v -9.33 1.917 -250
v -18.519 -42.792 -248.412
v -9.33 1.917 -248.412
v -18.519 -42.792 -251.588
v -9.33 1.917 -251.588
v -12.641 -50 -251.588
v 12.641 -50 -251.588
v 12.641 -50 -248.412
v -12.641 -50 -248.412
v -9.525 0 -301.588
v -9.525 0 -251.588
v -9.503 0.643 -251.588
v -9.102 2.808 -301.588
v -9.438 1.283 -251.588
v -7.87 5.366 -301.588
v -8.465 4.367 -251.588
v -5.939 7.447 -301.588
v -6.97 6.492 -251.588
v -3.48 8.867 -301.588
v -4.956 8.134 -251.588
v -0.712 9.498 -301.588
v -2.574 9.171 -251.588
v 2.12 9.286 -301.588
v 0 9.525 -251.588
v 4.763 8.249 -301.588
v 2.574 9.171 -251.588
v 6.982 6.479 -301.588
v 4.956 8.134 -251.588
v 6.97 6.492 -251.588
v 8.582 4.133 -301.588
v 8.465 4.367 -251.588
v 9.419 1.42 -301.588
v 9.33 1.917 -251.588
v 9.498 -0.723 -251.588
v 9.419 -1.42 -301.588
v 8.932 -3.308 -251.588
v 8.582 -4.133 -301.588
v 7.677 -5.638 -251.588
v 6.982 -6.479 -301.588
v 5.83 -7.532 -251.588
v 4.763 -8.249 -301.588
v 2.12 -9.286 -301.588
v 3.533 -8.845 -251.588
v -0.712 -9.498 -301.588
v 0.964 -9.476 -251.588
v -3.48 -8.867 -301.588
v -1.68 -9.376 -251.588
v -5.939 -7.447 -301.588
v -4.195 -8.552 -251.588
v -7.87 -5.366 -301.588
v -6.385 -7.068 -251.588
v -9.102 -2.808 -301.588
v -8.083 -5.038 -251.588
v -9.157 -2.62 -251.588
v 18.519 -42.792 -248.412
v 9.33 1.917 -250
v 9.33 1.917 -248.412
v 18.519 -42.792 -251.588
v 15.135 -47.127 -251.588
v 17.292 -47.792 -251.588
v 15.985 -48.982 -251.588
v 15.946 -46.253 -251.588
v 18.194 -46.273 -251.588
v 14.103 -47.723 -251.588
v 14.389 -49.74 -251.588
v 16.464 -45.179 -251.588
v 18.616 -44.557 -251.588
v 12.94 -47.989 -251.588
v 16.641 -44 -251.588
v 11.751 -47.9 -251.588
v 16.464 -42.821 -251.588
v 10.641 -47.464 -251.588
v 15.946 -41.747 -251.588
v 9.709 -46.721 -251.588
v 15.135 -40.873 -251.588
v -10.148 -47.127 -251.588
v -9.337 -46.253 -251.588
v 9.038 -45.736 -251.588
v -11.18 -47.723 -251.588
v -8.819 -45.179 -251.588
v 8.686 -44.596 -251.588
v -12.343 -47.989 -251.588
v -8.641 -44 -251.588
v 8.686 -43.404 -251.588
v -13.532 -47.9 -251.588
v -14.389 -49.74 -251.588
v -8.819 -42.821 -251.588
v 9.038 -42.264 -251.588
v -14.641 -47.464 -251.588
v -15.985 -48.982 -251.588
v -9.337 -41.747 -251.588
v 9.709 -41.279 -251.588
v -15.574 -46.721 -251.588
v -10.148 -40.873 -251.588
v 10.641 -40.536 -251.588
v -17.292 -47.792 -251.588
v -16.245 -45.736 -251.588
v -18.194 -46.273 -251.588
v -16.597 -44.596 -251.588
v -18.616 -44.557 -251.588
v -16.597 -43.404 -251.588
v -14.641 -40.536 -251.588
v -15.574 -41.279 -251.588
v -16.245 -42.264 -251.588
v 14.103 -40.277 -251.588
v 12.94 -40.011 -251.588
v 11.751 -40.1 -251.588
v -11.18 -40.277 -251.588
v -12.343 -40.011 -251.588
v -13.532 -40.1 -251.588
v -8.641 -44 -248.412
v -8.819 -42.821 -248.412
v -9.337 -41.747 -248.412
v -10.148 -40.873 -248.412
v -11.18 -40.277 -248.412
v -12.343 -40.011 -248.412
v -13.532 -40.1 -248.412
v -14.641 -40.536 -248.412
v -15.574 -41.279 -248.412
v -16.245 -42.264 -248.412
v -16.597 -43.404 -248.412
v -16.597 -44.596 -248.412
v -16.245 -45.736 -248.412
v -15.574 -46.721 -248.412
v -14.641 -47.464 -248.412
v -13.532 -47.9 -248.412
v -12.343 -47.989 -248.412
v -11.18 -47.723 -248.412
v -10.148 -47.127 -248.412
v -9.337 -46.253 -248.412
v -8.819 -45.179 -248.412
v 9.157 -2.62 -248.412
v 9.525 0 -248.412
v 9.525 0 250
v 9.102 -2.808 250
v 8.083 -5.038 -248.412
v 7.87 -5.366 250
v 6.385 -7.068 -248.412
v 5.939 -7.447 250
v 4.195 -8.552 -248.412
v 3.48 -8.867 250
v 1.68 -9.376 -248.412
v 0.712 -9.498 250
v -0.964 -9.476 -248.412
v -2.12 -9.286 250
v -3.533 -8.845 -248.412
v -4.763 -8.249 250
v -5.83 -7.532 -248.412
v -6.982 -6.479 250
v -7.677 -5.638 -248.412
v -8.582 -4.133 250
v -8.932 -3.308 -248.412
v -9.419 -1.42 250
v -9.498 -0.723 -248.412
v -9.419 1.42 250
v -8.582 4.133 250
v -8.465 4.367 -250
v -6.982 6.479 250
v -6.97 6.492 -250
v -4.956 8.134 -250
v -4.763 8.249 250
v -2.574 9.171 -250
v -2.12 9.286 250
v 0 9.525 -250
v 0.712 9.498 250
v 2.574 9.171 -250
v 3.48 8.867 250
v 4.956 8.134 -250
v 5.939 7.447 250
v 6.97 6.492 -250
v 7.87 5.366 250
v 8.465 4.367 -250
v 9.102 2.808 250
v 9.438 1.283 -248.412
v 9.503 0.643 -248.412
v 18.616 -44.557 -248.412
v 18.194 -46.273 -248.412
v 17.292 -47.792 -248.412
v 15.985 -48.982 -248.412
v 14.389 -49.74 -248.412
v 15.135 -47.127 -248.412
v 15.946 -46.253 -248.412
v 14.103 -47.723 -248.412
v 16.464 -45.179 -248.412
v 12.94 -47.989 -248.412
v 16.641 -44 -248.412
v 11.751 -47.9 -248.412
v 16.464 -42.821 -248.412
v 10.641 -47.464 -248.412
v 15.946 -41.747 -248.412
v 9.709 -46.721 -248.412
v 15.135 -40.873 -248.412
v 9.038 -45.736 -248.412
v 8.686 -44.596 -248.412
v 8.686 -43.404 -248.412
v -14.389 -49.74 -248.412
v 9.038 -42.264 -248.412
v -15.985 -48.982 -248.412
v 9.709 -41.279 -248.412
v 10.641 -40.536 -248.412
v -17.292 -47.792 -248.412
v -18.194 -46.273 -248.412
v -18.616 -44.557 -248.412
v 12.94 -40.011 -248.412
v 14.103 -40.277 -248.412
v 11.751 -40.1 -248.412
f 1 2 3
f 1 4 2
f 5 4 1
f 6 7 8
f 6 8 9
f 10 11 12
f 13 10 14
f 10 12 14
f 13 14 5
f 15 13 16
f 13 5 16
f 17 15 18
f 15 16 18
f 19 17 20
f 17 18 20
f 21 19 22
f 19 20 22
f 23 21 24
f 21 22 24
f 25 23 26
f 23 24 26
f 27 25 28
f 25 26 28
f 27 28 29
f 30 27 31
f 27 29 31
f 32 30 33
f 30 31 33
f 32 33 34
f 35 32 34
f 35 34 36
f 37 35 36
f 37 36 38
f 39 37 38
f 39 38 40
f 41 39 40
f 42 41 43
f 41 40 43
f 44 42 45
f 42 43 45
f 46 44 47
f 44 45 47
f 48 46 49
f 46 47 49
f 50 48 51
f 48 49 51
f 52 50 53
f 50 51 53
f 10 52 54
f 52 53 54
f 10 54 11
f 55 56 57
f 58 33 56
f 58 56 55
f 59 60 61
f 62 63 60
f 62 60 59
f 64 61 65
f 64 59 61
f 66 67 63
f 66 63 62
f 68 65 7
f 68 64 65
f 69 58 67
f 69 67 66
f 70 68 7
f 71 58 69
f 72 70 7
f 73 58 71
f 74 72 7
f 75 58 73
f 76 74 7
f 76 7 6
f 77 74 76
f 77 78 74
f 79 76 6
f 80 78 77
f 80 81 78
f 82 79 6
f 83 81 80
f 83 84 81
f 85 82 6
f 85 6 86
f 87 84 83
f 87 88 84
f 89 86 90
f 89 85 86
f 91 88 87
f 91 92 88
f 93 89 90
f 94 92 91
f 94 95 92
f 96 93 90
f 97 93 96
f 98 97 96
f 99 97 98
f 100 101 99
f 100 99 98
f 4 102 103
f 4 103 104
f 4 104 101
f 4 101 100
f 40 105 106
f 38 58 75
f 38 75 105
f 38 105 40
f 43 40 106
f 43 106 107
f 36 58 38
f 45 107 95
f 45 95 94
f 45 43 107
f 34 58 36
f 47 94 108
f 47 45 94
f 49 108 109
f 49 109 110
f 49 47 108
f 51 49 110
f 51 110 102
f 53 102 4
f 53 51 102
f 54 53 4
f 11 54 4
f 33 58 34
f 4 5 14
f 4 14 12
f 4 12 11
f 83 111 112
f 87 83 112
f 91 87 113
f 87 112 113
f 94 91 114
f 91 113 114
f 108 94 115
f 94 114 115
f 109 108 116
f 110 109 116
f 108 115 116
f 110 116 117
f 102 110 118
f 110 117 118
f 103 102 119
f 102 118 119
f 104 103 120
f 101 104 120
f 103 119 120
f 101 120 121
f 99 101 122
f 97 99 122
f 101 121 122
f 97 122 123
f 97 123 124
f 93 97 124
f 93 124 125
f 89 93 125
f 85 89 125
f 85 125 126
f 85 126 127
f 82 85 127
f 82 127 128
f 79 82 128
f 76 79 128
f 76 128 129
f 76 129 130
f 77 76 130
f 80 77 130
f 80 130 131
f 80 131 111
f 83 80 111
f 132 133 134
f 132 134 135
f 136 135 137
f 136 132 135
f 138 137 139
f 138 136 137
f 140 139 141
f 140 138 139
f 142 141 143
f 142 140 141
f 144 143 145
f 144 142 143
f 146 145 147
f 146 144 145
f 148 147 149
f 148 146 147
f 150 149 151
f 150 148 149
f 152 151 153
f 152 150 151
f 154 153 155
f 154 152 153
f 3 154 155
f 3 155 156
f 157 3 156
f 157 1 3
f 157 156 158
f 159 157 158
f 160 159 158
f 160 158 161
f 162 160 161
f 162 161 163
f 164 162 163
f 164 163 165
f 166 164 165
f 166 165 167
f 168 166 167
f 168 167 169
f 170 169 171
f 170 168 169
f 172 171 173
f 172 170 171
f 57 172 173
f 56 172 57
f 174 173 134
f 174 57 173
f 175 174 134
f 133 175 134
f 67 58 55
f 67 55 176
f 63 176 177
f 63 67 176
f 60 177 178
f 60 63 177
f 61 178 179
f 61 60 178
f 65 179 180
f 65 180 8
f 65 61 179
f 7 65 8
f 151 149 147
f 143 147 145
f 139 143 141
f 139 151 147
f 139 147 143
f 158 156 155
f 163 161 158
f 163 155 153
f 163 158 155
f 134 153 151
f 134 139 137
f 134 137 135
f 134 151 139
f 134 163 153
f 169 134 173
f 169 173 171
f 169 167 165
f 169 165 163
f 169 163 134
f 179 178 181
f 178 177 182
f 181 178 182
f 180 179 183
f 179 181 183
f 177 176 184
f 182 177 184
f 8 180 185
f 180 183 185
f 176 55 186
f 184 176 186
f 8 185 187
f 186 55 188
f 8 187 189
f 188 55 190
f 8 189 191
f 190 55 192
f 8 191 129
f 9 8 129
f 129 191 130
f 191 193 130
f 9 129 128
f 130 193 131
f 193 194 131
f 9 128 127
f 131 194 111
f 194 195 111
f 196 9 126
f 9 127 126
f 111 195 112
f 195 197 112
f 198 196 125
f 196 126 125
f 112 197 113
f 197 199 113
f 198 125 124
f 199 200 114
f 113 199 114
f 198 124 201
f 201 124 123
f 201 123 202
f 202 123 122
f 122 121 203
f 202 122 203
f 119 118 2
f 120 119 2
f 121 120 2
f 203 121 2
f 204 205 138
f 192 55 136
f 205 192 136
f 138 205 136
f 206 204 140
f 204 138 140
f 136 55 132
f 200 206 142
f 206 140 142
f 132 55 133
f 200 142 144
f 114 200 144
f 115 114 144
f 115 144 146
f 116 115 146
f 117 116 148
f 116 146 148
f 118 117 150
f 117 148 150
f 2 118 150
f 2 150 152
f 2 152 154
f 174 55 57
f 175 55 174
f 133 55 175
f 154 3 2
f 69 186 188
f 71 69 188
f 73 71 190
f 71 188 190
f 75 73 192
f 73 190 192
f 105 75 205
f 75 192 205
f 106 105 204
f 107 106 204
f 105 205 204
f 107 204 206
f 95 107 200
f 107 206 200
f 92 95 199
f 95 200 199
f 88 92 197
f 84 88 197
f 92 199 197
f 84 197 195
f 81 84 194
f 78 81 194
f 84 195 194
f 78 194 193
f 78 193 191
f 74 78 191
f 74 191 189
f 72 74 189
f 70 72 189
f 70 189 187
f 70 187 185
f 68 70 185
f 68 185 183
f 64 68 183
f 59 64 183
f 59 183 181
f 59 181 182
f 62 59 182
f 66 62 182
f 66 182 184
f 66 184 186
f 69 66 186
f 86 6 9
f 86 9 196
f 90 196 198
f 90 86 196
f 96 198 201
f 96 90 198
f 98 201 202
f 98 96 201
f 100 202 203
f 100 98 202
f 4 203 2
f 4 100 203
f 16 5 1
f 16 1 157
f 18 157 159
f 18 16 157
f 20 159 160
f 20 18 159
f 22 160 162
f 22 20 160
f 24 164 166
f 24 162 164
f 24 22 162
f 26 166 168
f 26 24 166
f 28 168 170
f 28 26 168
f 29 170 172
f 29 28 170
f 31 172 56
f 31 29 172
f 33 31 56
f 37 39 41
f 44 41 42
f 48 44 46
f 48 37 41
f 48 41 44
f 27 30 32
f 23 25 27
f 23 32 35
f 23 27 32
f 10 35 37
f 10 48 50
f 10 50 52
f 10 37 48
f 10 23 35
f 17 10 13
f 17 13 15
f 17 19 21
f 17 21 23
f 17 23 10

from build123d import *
from build123d.topology import SkipClean

# Parameters (mm, degrees)
SKETCH1_R           = 9.525
BOSS_EXTRUDE1_DEPTH = 250
BOSS_EXTRUDE2_DEPTH = 1.5875
CUT_EXTRUDE1_REACH  = 503.261
SKETCH3_R           = 4
SKETCH4_R           = 9.525
BOSS_EXTRUDE3_DEPTH = 50


with BuildPart() as part:
    # Sketch1 → Boss-Extrude1 (new, symmetric)
    with BuildSketch(Plane.XY):
        Circle(SKETCH1_R)
    extrude(amount=BOSS_EXTRUDE1_DEPTH, both=True)

    # Sketch2 → Boss-Extrude2 (add, symmetric)
    with SkipClean():  # the faces are left unmerged after this step: merging them gives an invalid solid
        with BuildSketch(Plane(origin=(0, 0, -250), x_dir=(-1, 0, 0), z_dir=(0, 0, -1))):
            with BuildLine():
                Line((-9.32999835, 1.91748684), (-18.518650577, -42.792134274))
                ThreePointArc((-18.518650577, -42.792134274), (-17.291604236, -47.791622716), (-12.641486262, -50))
                Line((-12.641486262, -50), (12.641486262, -50))
                ThreePointArc((12.641486262, -50), (17.291604236, -47.791622716), (18.518650577, -42.792134274))
                Line((18.518650577, -42.792134274), (9.32999835, 1.91748684))
                ThreePointArc((9.32999835, 1.91748684), (0, 9.525), (-9.32999835, 1.91748684))
            make_face()
        extrude(amount=BOSS_EXTRUDE2_DEPTH, both=True)
    add(part.part.scale(1), mode=Mode.REPLACE)  # the faces are merged on a copy

    # Sketch3 → Cut-Extrude1 (cut, up to next)
    with BuildSketch(Plane.XY.offset(-248.4125), mode=Mode.PRIVATE) as cut_extrude1_sk1:
        with Locations((-12.641486262, -44)):
            Circle(SKETCH3_R)
    cut_extrude1_tool1 = extrude(cut_extrude1_sk1.sketch, amount=-CUT_EXTRUDE1_REACH, mode=Mode.PRIVATE) & part.part
    # Sketch3 → Cut-Extrude1 (cut, up to next)
    with BuildSketch(Plane.XY.offset(-248.4125), mode=Mode.PRIVATE) as cut_extrude1_sk2:
        with Locations((12.641486262, -44)):
            Circle(SKETCH3_R)
    cut_extrude1_tool2 = extrude(cut_extrude1_sk2.sketch, amount=-CUT_EXTRUDE1_REACH, mode=Mode.PRIVATE) & part.part
    add(cut_extrude1_tool1.solids().sort_by_distance((-12.641486, -44, -248.4125))[0], mode=Mode.SUBTRACT)
    add(cut_extrude1_tool2.solids().sort_by_distance((12.641486, -44, -248.4125))[0], mode=Mode.SUBTRACT)

    # Sketch4 → Boss-Extrude3 (add)
    with BuildSketch(Plane(origin=(0, 0, -251.5875), x_dir=(-1, 0, 0), z_dir=(0, 0, -1))):
        Circle(SKETCH4_R)
    extrude(amount=BOSS_EXTRUDE3_DEPTH)


solid = part.part
